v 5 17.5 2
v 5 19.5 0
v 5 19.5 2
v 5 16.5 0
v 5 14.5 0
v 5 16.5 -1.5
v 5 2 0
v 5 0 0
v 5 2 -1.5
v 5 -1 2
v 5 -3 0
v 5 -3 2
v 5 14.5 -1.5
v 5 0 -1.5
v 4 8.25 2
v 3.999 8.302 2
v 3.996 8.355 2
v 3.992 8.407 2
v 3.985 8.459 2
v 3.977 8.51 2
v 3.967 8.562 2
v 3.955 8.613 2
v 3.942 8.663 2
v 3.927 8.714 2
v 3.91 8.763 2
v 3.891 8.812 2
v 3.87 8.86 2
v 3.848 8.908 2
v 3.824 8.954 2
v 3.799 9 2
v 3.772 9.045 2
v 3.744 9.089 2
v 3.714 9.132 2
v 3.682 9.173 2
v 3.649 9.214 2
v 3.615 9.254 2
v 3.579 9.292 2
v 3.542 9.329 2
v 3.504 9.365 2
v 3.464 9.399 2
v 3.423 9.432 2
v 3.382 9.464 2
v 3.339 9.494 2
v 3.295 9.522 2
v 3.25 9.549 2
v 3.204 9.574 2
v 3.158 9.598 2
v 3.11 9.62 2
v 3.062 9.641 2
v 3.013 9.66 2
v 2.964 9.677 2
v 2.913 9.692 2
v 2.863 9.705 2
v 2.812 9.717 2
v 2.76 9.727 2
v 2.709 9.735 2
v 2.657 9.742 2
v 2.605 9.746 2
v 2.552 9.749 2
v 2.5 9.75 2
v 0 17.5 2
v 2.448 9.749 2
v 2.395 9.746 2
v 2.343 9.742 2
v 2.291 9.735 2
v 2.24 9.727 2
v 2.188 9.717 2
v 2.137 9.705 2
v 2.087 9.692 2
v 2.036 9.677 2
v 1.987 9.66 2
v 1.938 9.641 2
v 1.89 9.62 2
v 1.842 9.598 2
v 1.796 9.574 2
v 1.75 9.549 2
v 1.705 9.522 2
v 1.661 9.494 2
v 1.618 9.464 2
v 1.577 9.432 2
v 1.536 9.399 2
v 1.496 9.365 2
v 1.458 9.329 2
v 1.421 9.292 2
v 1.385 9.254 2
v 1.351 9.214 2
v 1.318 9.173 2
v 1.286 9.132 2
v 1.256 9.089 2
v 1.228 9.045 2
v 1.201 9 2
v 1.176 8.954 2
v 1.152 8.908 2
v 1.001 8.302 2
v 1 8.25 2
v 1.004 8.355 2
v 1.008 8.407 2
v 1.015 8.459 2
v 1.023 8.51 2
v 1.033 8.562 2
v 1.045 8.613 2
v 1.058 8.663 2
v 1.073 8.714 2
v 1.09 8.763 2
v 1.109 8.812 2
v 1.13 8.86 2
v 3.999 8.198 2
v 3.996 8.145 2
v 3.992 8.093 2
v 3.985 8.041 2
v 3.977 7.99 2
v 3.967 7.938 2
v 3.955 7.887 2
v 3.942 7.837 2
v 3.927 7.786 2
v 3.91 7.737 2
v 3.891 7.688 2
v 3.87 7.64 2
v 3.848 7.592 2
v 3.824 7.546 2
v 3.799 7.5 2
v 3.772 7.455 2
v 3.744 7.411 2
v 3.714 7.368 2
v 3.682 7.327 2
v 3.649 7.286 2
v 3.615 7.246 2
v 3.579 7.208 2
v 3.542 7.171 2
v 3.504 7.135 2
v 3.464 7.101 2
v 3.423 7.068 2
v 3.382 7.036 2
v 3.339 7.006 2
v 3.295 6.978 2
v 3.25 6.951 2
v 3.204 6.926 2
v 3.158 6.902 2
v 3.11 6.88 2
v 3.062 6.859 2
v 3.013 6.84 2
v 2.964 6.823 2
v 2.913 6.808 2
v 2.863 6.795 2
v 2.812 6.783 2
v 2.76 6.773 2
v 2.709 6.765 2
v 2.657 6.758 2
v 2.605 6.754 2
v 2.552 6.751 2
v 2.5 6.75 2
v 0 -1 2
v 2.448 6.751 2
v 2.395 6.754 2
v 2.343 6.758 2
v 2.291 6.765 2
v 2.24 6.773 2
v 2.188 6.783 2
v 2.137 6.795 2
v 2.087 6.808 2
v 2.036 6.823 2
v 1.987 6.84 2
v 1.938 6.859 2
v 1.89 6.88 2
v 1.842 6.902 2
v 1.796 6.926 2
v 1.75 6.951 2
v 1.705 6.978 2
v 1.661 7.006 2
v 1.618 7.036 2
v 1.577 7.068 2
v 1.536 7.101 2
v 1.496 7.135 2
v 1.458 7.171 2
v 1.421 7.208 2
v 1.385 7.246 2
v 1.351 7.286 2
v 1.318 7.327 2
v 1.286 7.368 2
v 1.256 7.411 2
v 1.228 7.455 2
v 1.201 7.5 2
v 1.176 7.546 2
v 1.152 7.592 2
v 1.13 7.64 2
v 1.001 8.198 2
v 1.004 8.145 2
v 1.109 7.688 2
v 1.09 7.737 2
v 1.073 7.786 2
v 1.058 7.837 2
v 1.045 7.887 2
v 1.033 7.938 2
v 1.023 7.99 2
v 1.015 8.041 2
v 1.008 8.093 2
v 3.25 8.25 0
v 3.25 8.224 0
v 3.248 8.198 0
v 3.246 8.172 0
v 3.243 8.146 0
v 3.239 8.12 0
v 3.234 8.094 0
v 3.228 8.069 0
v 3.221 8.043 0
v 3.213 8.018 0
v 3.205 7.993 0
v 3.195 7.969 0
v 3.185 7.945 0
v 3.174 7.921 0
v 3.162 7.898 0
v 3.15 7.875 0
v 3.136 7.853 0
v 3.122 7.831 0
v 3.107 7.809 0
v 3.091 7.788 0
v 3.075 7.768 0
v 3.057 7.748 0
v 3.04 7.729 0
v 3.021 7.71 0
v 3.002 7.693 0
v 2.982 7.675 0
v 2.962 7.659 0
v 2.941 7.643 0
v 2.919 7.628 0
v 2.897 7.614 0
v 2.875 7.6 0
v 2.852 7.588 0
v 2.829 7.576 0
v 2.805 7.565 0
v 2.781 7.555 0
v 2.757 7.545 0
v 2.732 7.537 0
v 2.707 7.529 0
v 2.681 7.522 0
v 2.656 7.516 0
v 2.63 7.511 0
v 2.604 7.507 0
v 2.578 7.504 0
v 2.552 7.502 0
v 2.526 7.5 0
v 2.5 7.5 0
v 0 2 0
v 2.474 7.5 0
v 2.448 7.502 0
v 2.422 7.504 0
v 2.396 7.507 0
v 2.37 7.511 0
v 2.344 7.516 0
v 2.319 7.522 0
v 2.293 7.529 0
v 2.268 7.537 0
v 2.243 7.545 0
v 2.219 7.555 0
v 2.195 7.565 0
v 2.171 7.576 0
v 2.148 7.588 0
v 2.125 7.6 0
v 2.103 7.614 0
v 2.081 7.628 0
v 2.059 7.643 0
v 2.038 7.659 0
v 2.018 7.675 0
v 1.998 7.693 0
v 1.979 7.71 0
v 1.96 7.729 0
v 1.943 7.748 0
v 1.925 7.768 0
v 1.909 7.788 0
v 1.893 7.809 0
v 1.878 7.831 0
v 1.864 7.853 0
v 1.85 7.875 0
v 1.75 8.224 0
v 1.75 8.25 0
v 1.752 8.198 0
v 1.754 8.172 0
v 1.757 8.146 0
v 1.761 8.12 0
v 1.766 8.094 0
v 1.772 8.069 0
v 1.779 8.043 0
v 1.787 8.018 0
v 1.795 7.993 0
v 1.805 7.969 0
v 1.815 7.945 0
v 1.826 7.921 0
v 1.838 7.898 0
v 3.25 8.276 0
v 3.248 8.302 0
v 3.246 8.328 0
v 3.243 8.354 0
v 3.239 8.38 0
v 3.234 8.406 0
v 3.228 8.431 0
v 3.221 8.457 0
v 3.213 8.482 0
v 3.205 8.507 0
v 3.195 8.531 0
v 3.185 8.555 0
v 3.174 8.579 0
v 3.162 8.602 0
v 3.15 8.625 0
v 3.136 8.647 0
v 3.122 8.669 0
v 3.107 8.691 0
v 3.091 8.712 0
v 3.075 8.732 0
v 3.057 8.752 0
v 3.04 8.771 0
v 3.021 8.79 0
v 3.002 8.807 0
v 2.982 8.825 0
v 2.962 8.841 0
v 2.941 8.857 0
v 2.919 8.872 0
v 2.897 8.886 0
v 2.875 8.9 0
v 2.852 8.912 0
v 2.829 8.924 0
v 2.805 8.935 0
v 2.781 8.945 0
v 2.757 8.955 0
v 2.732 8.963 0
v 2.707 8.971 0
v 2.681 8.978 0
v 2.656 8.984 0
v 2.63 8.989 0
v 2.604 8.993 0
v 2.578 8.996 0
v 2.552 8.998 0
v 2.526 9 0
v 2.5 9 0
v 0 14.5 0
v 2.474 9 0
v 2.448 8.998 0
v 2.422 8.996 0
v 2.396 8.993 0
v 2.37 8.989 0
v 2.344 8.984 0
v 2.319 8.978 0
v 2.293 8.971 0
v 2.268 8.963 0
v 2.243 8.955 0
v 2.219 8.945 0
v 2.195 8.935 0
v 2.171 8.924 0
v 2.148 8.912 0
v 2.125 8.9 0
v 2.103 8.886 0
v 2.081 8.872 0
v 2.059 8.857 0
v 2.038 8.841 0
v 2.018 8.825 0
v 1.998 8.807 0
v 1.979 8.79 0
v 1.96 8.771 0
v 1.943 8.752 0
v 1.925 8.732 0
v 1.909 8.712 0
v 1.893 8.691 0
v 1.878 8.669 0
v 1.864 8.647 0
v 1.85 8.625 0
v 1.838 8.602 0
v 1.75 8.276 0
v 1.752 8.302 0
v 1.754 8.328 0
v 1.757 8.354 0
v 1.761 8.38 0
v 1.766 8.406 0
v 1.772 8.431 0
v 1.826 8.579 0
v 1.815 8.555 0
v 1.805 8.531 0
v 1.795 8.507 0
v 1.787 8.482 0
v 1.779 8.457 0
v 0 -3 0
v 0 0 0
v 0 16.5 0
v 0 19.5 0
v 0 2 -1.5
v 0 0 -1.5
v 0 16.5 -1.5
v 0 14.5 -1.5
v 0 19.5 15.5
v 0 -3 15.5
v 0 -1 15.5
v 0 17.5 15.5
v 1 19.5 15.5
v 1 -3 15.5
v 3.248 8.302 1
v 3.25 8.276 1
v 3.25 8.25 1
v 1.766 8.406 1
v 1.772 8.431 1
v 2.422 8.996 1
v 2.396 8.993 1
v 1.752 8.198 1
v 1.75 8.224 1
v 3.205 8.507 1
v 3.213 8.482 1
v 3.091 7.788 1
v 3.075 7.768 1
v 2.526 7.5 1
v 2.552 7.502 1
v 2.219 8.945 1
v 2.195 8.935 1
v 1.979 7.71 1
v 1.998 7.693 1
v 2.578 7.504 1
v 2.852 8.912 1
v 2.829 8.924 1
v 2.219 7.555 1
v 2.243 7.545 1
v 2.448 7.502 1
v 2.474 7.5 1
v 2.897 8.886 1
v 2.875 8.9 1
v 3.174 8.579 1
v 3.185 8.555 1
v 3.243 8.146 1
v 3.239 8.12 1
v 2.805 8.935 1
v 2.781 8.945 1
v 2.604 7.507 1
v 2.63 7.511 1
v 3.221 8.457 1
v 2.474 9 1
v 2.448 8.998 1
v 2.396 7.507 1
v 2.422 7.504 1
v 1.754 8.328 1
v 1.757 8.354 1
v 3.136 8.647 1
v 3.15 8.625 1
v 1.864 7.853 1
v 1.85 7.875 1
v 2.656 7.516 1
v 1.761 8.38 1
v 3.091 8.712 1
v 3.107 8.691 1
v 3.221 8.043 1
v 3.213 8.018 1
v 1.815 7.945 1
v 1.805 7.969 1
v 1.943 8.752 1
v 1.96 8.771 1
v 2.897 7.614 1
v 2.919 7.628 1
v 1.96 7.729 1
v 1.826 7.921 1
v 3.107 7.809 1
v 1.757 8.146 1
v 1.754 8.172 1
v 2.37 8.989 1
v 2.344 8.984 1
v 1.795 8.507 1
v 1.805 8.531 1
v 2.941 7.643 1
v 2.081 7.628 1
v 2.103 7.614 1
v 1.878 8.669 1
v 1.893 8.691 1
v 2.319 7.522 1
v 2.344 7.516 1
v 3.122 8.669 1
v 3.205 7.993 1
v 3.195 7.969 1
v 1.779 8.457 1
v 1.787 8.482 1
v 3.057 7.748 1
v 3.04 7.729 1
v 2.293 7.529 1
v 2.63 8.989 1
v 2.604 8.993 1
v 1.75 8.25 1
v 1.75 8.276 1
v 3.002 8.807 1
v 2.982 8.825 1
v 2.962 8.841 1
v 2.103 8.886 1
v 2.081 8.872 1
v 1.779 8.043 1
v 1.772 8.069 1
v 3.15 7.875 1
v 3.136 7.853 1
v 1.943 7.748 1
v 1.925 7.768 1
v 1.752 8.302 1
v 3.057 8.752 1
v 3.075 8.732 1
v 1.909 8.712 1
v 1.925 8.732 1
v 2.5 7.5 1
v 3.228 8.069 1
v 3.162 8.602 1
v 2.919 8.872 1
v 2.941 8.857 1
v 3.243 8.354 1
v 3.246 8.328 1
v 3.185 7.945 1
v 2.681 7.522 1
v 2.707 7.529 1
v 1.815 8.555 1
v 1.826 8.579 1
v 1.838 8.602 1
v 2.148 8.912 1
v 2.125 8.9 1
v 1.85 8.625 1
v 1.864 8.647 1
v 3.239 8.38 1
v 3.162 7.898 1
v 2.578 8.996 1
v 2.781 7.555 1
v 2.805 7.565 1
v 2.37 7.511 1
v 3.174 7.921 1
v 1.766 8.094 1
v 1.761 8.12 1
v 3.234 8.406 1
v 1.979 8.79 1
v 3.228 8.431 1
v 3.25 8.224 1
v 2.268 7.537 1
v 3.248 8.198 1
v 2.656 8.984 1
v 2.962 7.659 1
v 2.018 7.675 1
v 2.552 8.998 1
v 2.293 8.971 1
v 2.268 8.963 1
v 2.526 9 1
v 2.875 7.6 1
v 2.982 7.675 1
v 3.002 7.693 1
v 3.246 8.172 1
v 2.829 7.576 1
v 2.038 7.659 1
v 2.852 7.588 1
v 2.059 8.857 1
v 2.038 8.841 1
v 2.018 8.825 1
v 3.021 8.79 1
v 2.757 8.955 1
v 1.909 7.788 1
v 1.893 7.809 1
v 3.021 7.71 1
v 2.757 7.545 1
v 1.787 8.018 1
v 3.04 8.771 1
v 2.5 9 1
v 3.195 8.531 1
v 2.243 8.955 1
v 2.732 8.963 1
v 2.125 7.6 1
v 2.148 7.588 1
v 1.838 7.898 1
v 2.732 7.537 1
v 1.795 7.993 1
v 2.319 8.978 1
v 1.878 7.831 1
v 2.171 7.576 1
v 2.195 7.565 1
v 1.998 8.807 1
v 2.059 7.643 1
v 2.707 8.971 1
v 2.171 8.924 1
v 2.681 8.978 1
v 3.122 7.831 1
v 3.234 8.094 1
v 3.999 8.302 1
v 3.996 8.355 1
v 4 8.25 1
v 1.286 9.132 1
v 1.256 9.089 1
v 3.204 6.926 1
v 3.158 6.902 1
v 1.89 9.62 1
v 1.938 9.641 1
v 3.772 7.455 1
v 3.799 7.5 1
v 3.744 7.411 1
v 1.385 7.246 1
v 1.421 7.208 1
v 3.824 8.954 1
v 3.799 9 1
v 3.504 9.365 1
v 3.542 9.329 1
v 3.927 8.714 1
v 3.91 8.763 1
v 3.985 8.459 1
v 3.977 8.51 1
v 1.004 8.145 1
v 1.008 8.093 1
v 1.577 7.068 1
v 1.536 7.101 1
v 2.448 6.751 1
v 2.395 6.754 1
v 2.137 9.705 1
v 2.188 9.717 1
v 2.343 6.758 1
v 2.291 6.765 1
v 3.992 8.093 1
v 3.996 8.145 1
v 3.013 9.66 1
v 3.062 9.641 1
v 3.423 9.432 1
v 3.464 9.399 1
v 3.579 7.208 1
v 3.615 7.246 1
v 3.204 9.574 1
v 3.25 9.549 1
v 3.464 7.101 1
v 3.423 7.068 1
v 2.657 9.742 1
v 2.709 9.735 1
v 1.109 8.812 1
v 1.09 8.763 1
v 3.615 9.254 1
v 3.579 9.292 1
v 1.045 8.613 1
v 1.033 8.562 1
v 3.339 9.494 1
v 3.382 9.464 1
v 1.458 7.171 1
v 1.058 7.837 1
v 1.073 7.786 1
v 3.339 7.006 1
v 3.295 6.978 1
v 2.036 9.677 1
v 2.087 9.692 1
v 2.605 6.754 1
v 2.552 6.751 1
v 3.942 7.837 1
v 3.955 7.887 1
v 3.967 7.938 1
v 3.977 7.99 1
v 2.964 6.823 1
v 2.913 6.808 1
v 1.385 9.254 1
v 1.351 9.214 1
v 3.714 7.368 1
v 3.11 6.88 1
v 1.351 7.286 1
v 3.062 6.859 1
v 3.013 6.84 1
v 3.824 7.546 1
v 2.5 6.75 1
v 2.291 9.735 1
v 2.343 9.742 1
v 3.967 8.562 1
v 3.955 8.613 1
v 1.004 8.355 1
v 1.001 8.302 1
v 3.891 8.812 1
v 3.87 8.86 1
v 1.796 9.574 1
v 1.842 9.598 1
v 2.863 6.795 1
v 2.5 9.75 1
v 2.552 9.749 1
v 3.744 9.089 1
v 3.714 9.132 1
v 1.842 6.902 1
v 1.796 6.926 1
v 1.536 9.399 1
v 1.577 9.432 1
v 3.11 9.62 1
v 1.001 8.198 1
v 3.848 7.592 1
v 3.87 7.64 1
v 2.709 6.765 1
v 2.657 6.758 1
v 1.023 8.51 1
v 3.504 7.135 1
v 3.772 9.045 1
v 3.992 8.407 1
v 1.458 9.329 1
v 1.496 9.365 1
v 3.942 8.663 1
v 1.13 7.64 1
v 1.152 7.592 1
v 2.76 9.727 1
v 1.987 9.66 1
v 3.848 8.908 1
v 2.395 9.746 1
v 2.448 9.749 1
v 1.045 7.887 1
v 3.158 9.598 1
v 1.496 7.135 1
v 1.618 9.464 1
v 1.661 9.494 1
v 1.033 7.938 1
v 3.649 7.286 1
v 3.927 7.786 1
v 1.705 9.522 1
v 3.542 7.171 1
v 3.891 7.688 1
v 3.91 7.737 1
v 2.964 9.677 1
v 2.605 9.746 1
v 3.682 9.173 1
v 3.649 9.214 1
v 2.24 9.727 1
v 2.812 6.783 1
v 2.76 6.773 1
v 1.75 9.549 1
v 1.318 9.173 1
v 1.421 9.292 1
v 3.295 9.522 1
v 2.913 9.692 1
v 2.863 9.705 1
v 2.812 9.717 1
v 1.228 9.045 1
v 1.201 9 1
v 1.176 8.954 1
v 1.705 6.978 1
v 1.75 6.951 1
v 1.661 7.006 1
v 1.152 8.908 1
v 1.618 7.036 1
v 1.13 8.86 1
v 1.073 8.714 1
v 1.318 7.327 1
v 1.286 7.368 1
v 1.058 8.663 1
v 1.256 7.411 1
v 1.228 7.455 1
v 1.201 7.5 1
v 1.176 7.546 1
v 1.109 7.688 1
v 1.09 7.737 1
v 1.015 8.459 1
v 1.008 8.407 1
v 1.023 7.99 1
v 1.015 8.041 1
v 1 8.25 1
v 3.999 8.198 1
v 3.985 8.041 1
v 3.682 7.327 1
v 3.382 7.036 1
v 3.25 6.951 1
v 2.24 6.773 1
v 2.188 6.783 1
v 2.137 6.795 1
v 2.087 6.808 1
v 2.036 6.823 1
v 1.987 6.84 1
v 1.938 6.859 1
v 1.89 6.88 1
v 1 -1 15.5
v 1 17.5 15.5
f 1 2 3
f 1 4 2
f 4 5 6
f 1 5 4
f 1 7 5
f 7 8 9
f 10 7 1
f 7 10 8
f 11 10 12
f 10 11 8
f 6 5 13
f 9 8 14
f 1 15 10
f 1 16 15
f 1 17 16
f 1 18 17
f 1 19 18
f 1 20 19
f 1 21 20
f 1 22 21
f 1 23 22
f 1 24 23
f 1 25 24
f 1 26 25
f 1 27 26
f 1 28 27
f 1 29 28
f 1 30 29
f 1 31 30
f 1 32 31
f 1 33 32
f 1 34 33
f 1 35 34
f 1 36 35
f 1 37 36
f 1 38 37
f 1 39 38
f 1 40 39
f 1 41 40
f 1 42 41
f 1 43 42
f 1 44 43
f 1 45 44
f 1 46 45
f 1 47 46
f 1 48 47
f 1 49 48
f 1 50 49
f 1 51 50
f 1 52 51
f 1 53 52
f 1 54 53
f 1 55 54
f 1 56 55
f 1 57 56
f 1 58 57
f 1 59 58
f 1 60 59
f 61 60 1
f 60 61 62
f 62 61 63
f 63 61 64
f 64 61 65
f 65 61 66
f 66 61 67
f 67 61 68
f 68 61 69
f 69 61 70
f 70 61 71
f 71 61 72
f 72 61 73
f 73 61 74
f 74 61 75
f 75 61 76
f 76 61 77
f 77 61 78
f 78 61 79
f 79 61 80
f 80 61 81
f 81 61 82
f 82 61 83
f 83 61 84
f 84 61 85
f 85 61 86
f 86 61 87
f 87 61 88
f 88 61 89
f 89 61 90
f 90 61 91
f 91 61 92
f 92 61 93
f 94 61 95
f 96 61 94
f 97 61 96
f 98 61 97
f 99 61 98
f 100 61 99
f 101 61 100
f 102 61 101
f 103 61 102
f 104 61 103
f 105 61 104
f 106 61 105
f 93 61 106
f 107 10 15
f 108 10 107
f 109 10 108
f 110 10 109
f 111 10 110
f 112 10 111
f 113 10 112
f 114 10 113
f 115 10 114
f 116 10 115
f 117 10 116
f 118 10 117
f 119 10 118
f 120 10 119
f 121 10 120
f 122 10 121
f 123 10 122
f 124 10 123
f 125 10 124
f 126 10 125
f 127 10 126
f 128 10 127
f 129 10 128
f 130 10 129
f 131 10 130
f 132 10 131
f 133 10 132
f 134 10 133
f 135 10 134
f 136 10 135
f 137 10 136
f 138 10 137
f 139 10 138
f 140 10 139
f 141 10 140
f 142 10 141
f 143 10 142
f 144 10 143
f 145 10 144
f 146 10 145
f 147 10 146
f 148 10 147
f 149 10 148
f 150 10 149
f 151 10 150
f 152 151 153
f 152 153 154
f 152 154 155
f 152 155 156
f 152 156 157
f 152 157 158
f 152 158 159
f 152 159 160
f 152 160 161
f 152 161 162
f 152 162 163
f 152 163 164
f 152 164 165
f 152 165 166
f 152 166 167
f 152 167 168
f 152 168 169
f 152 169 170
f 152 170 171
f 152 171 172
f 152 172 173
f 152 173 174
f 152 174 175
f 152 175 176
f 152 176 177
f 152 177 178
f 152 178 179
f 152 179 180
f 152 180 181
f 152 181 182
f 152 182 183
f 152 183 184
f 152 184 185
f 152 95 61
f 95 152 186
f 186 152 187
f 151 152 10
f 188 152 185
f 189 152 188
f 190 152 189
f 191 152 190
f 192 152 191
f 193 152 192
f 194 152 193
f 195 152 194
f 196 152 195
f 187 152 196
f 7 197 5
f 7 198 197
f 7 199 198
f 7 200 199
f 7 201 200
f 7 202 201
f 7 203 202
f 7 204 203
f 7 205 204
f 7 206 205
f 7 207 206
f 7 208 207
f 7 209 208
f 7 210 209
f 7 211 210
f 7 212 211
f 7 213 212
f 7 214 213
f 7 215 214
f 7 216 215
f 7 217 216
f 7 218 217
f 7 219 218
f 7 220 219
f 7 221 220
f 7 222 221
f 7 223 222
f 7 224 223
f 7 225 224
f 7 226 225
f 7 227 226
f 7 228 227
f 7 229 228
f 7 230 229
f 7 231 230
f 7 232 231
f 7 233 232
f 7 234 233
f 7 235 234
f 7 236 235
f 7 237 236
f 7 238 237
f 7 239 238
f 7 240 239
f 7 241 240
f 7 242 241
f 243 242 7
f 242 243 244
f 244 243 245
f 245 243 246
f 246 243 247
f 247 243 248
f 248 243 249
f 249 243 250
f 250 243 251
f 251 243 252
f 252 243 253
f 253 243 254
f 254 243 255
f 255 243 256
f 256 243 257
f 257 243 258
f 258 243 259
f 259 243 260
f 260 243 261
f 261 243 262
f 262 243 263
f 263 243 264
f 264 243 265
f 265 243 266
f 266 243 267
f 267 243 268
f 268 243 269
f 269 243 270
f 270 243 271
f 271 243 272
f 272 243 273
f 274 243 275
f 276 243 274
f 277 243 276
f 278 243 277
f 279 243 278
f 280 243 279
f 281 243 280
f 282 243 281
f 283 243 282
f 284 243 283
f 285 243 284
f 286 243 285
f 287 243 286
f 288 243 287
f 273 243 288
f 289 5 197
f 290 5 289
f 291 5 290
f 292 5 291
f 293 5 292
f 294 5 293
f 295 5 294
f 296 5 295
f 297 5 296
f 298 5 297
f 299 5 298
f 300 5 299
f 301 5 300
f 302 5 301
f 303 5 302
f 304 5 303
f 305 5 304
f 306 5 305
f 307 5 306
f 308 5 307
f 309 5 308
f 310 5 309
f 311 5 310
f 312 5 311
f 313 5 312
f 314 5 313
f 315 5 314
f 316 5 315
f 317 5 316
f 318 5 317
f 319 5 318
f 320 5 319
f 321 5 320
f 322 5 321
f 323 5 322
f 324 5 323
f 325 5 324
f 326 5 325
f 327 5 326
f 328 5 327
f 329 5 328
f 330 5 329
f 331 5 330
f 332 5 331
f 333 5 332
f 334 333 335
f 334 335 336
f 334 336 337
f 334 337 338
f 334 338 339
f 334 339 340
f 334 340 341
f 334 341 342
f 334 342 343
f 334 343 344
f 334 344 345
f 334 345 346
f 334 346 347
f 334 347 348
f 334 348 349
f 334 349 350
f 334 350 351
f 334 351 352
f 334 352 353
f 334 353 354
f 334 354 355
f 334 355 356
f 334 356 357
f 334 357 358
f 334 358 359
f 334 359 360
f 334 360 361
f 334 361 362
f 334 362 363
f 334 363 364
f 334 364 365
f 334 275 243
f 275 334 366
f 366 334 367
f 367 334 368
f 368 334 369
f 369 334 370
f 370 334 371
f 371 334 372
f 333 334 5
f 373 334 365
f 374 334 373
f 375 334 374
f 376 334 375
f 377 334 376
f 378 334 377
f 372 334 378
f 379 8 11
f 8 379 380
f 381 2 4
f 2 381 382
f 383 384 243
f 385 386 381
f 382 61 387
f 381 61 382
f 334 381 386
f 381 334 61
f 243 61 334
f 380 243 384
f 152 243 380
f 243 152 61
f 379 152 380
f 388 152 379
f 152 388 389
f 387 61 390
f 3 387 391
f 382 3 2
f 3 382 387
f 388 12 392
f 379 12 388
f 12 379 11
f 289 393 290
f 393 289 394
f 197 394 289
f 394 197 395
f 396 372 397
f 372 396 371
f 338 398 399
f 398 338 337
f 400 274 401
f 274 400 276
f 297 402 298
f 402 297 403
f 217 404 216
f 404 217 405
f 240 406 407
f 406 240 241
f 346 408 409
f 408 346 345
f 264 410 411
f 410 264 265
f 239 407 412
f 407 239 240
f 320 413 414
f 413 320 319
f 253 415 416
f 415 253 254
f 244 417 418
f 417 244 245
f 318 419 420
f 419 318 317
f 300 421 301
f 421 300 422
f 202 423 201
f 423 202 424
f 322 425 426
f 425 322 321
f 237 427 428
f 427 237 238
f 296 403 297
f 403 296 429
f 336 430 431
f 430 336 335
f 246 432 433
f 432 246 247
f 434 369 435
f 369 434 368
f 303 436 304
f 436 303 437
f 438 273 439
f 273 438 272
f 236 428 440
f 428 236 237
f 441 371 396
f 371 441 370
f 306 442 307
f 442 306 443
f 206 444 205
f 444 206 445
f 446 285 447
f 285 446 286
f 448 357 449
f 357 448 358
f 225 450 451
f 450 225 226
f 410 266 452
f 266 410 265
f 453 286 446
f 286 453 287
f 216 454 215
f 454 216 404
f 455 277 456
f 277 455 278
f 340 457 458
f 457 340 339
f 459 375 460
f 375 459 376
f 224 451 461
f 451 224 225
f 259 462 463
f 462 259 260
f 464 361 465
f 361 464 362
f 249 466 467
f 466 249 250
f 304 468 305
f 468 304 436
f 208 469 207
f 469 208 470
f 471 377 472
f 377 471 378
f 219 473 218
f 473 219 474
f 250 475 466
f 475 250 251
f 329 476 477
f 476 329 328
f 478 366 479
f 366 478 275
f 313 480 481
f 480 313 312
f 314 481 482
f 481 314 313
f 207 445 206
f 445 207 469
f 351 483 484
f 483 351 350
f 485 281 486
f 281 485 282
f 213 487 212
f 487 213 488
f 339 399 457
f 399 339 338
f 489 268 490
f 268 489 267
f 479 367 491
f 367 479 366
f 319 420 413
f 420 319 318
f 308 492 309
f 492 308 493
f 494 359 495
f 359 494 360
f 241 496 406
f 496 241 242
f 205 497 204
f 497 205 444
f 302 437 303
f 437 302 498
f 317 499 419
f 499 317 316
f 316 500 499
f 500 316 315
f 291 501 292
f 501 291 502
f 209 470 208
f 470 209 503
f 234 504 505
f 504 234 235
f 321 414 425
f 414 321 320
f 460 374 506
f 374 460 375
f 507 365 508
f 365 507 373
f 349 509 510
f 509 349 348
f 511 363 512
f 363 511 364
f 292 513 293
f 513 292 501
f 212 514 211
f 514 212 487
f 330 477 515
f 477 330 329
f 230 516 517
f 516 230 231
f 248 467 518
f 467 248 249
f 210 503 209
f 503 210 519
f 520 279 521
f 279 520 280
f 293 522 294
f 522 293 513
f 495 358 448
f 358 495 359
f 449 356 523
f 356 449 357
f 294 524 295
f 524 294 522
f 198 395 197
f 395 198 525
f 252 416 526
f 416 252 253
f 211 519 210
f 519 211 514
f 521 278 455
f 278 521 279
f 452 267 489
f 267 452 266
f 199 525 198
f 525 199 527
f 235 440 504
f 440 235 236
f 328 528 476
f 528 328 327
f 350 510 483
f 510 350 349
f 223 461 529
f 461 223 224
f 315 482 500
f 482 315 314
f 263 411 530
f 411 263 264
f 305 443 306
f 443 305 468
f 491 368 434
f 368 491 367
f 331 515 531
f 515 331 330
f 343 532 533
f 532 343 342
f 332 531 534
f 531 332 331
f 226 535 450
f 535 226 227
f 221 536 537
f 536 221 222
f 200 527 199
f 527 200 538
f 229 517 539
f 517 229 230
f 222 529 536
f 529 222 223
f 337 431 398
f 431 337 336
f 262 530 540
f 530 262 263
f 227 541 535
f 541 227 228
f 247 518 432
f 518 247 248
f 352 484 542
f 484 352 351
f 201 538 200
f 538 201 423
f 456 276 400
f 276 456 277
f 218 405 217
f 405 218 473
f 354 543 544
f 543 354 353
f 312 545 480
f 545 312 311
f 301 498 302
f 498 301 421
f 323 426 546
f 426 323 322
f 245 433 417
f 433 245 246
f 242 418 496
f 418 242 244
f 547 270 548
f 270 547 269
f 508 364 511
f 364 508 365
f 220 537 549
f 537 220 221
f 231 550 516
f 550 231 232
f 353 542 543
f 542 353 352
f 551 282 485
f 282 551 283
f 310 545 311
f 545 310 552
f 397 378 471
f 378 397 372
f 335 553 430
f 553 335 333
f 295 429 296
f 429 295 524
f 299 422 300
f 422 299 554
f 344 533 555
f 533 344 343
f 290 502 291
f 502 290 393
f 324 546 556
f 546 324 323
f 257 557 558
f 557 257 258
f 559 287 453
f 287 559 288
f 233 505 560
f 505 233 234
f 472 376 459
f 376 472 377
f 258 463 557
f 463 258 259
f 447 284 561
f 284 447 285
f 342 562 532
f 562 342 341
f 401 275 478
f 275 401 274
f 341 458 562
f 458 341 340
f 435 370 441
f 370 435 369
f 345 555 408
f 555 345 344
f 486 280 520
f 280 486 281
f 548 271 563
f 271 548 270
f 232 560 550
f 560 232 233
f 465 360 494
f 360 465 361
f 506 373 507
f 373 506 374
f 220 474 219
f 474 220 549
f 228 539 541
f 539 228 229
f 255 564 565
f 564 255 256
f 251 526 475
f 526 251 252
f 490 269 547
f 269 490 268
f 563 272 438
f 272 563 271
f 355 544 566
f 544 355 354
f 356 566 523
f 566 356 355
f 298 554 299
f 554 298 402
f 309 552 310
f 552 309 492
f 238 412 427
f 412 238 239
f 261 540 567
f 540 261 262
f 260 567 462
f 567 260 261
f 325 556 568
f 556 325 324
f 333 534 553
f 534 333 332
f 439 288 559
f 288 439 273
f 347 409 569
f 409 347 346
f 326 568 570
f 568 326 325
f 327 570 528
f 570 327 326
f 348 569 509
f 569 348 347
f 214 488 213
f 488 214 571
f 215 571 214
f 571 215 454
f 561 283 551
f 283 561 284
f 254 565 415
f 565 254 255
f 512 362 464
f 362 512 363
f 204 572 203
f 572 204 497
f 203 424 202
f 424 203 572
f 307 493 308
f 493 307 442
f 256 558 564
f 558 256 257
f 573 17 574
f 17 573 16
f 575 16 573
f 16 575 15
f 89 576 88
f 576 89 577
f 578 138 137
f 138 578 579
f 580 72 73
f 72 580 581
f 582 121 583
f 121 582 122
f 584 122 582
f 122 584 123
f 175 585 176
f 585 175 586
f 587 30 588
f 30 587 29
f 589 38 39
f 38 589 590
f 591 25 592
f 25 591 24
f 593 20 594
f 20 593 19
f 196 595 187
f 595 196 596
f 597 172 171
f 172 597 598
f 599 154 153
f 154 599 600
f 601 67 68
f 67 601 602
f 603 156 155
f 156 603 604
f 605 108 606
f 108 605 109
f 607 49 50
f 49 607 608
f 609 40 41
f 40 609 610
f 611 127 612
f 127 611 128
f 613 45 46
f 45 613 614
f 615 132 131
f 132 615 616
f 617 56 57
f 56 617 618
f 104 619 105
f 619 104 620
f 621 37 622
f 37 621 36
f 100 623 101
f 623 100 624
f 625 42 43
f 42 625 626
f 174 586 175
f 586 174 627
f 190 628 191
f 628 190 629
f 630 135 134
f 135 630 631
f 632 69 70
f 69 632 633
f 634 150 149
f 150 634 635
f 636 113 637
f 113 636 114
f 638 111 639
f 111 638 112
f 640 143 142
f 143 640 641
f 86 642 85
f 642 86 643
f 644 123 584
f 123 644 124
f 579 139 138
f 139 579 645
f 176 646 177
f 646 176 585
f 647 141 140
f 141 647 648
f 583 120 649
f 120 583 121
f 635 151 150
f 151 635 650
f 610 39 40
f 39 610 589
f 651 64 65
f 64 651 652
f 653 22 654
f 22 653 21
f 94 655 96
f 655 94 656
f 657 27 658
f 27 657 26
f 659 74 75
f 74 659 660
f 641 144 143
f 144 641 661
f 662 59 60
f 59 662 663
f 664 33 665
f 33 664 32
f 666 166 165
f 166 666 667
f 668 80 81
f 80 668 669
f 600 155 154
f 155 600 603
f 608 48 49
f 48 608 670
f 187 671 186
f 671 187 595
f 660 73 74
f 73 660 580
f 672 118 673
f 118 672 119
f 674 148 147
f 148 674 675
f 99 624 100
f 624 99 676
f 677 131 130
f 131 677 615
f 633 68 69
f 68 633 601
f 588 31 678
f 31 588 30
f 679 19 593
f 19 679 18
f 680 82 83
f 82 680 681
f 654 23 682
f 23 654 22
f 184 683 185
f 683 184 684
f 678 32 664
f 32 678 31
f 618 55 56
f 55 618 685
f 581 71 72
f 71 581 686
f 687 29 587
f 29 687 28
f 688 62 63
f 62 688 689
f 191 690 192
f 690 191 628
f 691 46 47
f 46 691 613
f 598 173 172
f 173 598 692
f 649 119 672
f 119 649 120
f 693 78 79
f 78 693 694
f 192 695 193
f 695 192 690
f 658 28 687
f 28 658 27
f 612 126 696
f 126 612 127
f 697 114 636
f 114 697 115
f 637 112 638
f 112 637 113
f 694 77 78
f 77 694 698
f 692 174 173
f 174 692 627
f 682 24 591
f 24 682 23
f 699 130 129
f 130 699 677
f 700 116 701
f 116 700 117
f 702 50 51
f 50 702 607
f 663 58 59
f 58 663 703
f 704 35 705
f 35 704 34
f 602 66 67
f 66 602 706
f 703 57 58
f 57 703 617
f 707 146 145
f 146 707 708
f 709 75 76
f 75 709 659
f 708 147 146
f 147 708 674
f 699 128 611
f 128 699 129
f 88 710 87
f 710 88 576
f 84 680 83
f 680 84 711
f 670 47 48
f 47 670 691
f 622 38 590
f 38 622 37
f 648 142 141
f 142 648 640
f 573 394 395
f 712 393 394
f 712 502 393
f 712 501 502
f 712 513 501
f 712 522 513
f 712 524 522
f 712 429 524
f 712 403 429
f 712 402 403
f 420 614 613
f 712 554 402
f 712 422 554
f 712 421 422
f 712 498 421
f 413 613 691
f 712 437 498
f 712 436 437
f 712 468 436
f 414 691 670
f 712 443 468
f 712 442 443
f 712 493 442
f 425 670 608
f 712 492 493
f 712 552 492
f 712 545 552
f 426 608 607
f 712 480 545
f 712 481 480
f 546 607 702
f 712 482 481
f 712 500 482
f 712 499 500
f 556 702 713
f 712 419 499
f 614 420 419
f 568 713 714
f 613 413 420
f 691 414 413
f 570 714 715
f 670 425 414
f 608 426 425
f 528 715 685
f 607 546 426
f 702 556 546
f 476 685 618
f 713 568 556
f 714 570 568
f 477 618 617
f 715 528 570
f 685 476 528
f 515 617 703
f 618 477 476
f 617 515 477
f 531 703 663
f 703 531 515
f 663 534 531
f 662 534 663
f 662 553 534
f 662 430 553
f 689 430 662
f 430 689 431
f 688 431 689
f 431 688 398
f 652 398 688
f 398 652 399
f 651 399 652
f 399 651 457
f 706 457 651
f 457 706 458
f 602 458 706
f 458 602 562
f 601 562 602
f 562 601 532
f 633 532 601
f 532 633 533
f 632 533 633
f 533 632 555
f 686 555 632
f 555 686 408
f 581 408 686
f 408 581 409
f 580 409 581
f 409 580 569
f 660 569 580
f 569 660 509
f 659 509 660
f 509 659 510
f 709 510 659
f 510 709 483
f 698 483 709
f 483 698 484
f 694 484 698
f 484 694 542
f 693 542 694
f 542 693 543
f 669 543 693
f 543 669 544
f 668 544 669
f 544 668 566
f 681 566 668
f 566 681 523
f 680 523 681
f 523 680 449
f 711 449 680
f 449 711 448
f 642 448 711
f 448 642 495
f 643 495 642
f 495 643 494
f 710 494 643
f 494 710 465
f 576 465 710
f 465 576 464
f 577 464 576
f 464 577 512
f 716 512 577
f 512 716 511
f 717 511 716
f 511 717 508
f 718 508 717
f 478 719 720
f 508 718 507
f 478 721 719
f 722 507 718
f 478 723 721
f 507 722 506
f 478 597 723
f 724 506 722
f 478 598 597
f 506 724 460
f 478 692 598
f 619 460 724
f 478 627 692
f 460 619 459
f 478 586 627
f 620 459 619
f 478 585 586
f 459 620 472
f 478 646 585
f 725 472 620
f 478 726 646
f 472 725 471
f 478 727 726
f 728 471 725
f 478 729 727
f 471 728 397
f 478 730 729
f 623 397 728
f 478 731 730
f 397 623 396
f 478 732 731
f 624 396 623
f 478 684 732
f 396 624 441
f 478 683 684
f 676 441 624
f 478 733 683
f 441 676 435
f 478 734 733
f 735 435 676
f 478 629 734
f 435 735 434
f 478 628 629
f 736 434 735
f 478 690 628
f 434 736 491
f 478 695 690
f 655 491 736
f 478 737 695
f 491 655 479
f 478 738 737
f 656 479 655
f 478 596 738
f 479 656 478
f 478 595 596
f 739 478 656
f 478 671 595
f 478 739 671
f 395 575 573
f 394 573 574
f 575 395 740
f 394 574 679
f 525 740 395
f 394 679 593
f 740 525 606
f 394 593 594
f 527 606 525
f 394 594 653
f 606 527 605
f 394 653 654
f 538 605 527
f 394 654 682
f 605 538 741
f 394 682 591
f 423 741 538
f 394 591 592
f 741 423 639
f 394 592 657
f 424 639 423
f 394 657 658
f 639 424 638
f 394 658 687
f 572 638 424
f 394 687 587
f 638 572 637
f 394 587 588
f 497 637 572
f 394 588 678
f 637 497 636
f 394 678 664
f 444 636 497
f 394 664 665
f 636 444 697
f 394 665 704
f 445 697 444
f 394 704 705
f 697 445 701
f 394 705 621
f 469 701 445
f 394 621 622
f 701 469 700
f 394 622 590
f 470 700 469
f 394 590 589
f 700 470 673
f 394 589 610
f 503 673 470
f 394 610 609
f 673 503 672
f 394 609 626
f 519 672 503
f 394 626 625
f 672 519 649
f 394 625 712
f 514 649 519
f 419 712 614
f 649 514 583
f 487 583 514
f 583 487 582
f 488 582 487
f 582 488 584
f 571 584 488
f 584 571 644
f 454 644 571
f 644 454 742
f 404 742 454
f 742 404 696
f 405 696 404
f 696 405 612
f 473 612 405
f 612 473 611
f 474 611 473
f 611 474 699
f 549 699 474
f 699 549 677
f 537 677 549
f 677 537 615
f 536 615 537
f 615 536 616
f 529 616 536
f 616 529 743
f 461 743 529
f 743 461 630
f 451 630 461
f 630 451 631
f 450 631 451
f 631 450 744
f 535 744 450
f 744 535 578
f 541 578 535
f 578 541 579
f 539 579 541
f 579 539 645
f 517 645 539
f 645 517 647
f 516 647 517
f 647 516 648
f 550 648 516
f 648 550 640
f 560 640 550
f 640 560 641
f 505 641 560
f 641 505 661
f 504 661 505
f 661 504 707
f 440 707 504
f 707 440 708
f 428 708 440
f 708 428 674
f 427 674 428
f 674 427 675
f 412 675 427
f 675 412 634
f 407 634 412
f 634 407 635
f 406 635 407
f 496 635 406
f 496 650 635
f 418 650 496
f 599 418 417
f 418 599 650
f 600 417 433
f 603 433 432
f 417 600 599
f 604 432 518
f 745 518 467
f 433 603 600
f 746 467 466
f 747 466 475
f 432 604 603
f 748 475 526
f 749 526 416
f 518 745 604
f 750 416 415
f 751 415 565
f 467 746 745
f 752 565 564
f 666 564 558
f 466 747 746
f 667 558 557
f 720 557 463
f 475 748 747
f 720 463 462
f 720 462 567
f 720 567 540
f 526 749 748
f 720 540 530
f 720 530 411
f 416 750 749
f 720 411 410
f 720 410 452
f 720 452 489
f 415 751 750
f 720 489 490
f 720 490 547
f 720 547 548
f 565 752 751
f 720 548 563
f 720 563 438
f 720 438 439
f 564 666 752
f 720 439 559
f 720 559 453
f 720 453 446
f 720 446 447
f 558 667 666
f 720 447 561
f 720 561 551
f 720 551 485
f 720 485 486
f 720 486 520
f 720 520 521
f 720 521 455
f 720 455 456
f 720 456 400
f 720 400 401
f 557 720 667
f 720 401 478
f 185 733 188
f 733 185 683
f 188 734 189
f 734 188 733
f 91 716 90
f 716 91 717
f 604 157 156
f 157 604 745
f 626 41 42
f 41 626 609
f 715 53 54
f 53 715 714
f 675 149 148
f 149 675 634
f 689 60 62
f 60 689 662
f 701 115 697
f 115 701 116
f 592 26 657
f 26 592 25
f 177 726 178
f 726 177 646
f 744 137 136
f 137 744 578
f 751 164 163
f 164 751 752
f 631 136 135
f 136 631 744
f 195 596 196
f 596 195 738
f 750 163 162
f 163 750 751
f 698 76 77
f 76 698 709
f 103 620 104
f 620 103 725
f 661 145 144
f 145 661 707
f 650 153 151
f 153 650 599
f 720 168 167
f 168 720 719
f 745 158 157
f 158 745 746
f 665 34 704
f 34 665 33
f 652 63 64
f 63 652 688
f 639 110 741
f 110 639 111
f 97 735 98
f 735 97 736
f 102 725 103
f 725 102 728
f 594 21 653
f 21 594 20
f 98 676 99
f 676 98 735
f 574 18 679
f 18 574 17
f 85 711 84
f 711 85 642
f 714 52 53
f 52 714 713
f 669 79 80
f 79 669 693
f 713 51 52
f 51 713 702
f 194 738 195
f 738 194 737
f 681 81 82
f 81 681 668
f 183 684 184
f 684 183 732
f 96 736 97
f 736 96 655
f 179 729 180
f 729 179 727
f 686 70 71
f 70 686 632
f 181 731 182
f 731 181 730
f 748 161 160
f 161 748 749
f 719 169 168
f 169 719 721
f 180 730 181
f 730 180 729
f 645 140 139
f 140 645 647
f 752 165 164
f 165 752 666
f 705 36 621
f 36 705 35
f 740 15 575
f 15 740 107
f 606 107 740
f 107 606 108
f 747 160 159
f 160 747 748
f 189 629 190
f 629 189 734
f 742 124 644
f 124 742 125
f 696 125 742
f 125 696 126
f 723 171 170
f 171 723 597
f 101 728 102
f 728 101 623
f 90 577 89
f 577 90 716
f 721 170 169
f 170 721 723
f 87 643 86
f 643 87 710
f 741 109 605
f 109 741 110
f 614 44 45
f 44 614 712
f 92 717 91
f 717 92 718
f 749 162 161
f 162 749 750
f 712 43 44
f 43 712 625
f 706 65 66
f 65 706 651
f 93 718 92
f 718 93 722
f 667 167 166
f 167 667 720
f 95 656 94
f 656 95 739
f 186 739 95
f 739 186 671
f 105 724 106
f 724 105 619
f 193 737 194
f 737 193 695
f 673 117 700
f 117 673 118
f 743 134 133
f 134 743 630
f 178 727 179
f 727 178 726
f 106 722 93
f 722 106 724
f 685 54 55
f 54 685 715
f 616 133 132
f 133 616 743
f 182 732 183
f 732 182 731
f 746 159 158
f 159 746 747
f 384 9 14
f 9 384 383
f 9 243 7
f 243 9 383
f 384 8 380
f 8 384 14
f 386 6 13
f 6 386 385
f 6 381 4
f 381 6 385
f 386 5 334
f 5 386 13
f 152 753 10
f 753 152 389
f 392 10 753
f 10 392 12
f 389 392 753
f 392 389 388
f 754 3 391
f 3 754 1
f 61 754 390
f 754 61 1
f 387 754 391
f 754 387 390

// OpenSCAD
module triangle(l, w, h) {
    polyhedron(
        points=[[0,0,0], [l,0,0], [l,w,0], [0,w,0], [0,w,h], [l,w,h]],
        faces=[[0,1,2,3],[5,4,3,2],[0,4,5,1],[0,3,4],[5,2,1]]
    );
}


difference() {
    translate([0,-3,0]) cube([5,16.5+6,2],false);
    translate([2.5,16.5/2,0]) rotate([0,0,0]) cylinder(2,d=1.5,$fn=180,true);
    #translate([2.5,16.5/2,1]) rotate([0,0,0]) cylinder(1,d=3,$fn=180,true);
}
translate([0,0,-1.5]) cube([5,2,1.5],false);
translate([0,16.5-2,-1.5]) cube([5,2,1.5],false);

translate([5,-3,2]) rotate(90) triangle(2,4,13.5);
translate([0,-3,2]) cube([1,2,13.5],false);

translate([5,16.5+1,2]) rotate(90) triangle(2,4,13.5);
translate([0,16.5+1,2]) cube([1,2,13.5],false);
